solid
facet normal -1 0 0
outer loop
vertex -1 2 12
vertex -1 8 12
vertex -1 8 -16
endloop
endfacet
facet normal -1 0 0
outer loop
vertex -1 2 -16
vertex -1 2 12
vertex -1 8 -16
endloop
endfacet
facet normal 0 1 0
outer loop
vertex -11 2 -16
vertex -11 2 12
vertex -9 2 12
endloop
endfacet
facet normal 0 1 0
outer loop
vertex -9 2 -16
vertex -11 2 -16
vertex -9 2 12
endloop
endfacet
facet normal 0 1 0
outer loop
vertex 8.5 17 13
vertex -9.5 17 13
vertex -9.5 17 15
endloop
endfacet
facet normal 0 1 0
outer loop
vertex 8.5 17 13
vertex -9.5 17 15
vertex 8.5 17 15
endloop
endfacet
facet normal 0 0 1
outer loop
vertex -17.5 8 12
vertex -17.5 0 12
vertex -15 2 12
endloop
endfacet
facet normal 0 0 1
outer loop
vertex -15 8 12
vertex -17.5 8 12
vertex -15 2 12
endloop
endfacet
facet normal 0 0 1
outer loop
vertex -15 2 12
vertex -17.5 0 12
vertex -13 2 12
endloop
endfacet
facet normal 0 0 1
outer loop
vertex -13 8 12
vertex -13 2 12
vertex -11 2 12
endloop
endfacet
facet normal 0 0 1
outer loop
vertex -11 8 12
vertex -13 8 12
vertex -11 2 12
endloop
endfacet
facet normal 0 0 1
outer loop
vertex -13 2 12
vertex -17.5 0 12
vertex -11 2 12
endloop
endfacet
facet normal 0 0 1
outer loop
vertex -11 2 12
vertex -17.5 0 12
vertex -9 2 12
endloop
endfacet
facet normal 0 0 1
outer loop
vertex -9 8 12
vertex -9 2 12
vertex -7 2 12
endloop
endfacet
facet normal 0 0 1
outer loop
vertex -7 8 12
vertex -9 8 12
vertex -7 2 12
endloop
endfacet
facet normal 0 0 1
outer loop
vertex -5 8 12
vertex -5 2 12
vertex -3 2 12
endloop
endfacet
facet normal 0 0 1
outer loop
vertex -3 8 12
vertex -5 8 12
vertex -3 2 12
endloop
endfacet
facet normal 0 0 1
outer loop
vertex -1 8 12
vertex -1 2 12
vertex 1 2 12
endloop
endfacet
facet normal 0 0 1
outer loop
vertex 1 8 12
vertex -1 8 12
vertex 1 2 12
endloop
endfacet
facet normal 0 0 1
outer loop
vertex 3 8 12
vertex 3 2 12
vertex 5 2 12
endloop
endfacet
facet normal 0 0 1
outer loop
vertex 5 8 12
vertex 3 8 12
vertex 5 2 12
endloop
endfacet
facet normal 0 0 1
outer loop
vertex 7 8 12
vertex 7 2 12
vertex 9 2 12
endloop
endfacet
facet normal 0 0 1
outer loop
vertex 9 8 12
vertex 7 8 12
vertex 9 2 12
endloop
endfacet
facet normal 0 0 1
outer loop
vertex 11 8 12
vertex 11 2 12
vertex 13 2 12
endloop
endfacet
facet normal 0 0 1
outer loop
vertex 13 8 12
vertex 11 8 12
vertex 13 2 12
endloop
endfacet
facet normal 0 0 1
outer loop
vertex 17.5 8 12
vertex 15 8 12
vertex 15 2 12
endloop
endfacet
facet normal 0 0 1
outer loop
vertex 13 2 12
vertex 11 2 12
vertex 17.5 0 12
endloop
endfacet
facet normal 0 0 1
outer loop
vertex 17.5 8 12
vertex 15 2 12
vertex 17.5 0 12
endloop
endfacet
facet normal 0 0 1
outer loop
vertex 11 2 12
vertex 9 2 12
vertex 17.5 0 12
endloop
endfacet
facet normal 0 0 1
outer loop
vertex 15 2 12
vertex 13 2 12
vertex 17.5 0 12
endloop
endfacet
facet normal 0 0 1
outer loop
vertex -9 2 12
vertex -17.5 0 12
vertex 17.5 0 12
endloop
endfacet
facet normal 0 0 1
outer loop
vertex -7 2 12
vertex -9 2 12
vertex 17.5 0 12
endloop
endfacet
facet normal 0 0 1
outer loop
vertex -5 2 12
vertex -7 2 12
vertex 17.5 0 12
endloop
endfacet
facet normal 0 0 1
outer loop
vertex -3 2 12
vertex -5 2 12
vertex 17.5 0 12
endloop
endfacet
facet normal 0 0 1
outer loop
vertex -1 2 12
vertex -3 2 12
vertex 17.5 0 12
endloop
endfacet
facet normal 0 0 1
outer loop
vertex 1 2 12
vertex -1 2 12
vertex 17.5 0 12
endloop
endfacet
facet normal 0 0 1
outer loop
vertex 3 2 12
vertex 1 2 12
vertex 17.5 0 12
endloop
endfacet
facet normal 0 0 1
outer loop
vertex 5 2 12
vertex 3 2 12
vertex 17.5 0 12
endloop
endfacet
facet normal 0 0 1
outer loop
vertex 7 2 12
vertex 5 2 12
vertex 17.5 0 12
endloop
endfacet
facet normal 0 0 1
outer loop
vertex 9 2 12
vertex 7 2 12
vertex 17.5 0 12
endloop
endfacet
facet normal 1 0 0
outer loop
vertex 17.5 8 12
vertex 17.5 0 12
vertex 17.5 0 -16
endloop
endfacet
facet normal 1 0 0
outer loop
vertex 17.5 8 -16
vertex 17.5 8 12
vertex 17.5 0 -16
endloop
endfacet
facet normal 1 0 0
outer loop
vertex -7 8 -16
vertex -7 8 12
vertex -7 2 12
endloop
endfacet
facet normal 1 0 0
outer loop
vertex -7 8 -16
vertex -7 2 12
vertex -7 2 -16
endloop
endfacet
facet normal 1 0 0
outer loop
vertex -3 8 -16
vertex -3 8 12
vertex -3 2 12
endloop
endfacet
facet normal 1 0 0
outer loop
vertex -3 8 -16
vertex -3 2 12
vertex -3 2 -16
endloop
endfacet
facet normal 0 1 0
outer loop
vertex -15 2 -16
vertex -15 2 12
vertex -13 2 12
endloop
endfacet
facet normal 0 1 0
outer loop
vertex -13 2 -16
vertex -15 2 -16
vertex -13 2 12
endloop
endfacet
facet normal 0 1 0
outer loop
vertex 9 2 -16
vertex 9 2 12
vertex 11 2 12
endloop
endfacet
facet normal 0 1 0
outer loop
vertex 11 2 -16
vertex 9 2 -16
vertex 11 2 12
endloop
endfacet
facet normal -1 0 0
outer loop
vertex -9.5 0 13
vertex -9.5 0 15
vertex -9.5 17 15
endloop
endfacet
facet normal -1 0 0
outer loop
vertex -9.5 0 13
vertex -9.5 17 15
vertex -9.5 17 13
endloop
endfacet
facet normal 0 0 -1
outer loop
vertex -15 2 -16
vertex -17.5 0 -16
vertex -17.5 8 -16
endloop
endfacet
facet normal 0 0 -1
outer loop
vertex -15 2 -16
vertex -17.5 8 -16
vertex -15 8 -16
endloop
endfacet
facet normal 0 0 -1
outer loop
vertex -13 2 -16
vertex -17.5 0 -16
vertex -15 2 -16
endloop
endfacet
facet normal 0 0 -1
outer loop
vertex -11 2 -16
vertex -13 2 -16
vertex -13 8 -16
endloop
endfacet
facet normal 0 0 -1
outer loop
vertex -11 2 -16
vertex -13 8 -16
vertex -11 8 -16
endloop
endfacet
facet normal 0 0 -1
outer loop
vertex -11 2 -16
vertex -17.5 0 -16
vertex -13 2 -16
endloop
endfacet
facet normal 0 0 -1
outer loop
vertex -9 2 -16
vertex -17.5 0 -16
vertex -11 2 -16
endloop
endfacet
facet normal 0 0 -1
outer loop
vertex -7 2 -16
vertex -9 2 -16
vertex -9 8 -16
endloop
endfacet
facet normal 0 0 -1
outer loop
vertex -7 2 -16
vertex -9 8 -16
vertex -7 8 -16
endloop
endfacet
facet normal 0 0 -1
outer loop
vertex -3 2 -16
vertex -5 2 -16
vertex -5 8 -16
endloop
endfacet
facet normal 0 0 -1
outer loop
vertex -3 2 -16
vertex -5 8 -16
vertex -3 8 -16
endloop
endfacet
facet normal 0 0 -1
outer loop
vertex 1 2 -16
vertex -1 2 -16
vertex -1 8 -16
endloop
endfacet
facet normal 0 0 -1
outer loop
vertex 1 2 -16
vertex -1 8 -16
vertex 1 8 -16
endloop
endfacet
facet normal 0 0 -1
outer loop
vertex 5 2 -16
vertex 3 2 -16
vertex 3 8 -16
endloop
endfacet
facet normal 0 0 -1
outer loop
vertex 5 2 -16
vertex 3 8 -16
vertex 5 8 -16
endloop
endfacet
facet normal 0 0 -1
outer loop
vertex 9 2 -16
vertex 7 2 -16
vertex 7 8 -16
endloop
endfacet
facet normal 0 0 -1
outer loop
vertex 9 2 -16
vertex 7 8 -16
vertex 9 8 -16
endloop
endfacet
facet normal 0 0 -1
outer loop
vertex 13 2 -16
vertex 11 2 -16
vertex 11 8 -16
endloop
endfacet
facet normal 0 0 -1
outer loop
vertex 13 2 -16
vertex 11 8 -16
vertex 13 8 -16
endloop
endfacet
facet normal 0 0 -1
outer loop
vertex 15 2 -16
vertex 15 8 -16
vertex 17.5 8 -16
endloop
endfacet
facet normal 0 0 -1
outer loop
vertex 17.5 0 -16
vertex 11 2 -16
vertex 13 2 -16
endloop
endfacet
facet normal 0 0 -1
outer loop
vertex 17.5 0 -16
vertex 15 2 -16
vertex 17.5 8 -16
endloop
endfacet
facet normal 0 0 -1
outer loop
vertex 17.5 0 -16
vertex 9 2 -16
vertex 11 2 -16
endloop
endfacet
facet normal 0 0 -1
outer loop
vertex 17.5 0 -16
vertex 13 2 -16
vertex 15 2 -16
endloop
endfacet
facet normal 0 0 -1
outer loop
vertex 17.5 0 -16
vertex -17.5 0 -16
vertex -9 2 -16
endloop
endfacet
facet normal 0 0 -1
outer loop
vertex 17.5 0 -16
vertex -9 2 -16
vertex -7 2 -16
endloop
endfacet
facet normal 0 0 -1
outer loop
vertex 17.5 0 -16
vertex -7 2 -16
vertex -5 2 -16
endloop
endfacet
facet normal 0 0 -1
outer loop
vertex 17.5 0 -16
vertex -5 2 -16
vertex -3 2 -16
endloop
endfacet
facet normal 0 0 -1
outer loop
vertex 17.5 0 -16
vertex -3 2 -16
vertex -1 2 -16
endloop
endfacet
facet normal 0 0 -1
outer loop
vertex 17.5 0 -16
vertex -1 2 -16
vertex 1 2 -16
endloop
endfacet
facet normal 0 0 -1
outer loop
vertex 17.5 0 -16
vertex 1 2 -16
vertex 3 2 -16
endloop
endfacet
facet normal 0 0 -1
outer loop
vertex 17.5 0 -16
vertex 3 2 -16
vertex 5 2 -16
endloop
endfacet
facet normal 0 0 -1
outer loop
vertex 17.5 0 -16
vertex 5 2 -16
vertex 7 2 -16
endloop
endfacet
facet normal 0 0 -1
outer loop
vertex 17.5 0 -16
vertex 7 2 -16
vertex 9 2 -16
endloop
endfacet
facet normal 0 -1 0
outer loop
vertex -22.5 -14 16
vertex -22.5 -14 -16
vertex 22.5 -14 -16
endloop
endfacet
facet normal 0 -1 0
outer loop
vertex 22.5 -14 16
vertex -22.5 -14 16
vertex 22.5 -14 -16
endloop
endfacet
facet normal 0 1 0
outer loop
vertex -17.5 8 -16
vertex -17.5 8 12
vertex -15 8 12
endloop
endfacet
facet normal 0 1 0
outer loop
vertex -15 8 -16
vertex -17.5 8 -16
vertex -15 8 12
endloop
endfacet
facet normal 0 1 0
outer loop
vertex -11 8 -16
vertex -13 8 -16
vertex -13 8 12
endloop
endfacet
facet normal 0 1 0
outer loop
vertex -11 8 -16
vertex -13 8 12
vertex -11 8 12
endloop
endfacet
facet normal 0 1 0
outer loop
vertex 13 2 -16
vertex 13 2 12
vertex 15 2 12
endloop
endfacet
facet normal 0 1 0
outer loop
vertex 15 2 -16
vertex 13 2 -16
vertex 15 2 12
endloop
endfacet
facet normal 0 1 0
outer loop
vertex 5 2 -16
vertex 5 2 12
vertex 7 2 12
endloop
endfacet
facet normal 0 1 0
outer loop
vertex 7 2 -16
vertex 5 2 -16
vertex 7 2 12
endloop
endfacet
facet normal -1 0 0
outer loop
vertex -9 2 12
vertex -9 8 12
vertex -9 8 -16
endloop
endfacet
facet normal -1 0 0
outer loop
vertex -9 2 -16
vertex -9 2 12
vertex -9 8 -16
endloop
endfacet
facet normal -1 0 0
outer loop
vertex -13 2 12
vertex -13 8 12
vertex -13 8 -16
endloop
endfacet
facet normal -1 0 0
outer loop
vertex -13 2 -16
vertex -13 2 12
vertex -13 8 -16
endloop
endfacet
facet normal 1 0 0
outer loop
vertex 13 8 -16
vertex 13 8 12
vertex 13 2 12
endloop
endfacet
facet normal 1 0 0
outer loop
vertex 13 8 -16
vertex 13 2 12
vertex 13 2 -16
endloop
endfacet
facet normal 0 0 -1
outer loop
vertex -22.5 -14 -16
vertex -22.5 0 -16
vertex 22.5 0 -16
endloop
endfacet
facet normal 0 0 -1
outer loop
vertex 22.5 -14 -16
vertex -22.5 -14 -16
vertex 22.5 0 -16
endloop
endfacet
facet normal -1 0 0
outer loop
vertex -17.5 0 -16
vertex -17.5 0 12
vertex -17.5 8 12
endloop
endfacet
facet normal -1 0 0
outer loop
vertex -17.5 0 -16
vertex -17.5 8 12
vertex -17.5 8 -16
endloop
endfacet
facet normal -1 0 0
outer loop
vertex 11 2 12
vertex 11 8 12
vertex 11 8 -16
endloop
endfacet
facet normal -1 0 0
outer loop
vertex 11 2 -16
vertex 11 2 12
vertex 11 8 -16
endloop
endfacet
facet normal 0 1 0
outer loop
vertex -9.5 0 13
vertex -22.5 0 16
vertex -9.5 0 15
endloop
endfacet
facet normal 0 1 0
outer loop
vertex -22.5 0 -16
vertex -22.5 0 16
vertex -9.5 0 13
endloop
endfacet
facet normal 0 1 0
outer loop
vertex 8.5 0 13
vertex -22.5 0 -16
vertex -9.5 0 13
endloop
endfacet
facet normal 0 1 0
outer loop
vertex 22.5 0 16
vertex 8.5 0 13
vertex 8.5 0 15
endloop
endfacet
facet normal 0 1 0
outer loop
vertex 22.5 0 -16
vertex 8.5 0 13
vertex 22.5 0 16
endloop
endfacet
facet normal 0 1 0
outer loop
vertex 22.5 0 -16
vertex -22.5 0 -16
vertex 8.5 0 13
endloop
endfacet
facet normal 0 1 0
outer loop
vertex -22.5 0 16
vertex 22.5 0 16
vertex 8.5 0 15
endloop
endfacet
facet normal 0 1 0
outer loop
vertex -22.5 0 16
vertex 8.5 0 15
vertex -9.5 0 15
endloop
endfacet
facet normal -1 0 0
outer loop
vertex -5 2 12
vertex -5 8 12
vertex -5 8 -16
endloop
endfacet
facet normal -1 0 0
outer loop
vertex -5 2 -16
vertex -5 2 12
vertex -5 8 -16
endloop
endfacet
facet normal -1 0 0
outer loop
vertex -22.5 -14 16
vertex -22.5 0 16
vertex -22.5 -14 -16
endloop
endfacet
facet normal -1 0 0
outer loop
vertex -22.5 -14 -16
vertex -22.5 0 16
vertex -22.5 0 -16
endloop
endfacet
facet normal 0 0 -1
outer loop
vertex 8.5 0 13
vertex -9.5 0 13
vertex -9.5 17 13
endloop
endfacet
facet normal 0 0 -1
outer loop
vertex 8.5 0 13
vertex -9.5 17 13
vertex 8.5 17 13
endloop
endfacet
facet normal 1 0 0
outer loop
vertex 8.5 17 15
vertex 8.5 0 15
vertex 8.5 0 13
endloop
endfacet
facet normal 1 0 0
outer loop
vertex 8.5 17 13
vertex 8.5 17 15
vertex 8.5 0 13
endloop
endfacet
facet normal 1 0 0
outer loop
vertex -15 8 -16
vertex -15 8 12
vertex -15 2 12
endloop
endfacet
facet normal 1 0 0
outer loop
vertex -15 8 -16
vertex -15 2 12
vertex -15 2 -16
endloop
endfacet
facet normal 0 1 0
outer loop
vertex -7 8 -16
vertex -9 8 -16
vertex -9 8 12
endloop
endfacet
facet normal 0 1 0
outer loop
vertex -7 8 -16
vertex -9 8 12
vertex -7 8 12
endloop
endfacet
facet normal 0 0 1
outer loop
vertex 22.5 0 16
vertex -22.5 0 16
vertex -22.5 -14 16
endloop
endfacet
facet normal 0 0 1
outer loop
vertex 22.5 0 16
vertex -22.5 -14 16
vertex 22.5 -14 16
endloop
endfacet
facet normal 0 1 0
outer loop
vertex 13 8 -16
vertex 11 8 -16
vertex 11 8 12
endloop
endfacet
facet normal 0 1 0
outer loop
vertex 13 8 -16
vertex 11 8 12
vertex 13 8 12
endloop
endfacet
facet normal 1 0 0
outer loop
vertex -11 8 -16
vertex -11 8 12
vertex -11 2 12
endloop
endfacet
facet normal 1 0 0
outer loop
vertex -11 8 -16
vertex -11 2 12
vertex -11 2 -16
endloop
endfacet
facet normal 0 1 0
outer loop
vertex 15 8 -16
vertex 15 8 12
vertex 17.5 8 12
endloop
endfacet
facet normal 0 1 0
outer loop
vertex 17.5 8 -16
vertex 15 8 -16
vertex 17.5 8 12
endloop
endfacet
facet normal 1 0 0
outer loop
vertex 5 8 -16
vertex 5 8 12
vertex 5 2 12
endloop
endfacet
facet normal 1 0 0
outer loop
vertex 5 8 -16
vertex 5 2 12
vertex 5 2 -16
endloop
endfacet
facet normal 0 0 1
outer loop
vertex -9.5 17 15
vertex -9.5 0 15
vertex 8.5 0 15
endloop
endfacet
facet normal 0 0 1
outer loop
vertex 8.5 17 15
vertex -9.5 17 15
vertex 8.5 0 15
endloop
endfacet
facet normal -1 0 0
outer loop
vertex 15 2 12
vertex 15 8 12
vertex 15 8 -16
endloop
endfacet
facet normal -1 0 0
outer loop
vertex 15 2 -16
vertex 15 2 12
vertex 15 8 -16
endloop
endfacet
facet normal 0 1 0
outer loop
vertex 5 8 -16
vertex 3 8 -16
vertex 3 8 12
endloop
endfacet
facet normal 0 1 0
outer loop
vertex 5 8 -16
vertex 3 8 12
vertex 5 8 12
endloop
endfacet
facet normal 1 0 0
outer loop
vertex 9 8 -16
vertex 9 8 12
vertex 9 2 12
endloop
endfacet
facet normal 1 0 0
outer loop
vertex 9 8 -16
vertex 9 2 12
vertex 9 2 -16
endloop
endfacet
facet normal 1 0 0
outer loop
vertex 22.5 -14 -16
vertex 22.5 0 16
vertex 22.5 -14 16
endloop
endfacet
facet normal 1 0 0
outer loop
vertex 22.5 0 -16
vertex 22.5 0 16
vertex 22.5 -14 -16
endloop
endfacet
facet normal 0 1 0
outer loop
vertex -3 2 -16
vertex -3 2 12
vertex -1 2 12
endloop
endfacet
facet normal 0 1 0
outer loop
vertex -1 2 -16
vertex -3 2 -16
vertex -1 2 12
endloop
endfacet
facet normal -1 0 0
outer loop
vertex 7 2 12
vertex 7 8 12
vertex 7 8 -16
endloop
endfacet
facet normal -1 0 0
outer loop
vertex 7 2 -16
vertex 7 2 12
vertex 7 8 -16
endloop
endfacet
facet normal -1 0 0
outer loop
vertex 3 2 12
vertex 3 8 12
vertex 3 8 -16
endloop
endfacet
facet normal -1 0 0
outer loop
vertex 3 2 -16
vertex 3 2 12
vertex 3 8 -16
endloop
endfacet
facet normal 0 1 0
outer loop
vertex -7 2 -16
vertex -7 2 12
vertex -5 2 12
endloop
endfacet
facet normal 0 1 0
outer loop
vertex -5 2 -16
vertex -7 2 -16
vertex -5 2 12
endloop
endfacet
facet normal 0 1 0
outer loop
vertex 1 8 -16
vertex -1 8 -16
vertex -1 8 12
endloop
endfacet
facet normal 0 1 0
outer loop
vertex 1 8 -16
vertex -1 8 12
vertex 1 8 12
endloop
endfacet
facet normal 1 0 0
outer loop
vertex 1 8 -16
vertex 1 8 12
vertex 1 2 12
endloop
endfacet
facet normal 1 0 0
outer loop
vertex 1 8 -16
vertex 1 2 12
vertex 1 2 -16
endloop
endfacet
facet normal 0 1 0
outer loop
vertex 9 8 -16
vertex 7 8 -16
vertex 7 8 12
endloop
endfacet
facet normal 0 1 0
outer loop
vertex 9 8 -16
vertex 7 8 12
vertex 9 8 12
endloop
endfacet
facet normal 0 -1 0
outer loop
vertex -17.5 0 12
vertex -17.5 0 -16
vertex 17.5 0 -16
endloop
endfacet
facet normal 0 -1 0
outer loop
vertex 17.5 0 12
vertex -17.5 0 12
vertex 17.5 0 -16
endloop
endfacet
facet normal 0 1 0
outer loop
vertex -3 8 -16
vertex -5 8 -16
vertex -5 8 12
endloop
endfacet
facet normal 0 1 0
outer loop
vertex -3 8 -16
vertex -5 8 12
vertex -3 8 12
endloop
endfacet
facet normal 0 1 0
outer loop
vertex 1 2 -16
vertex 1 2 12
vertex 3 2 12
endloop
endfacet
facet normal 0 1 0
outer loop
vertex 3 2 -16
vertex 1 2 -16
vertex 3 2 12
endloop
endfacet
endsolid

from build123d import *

# Parameters (mm, degrees)
SKETCH1_W           = 45
SKETCH1_H           = 32
BOSS_EXTRUDE1_DEPTH = 14
SKETCH5_W           = 35
SKETCH5_H           = 28
BOSS_EXTRUDE2_DEPTH = 8
SKETCH8_W           = 2
SKETCH8_H           = 28
CUT_EXTRUDE2_DEPTH  = 6
LPATTERN3_COUNT     = 8
LPATTERN3_PITCH     = 4
SKETCH9_W           = 18
SKETCH9_H           = 2
BOSS_EXTRUDE3_DEPTH = 17


with BuildPart() as part:
    # Sketch1 → Boss-Extrude1 (new body)
    with BuildSketch(Plane(origin=(0, 0, 0), x_dir=(1, 0, 0), z_dir=(0, 1, 0))):
        Rectangle(SKETCH1_W, SKETCH1_H)
    extrude(amount=-BOSS_EXTRUDE1_DEPTH)

    # Sketch9 → Boss-Extrude3 (add)
    with BuildSketch(Plane(origin=(0, 0, 0), x_dir=(1, 0, 0), z_dir=(0, 1, 0))):
        with Locations((-0.5, -14)):
            Rectangle(SKETCH9_W, SKETCH9_H)
    extrude(amount=BOSS_EXTRUDE3_DEPTH)


with BuildPart() as body_2:
    # Sketch5 → Boss-Extrude2 (new body)
    with BuildSketch(Plane(origin=(0, 0, 0), x_dir=(1, 0, 0), z_dir=(0, 1, 0))):
        with Locations((0, 2)):
            Rectangle(SKETCH5_W, SKETCH5_H)
    extrude(amount=BOSS_EXTRUDE2_DEPTH)

    # Sketch8 → Cut-Extrude2 (cut)
    with BuildSketch(Plane(origin=(0, 8, 0), x_dir=(1, 0, 0), z_dir=(0, 1, 0))):
        with Locations((-14, 2)):
            Rectangle(SKETCH8_W, SKETCH8_H)
    cut_extrude2 = extrude(amount=-CUT_EXTRUDE2_DEPTH, mode=Mode.SUBTRACT)

    # LPattern3: Cut-Extrude2 ×8
    with Locations(*[(i * LPATTERN3_PITCH, 0, 0) for i in range(1, LPATTERN3_COUNT)]):
        add(cut_extrude2, mode=Mode.SUBTRACT)


solid = Compound([part.part, body_2.part])
